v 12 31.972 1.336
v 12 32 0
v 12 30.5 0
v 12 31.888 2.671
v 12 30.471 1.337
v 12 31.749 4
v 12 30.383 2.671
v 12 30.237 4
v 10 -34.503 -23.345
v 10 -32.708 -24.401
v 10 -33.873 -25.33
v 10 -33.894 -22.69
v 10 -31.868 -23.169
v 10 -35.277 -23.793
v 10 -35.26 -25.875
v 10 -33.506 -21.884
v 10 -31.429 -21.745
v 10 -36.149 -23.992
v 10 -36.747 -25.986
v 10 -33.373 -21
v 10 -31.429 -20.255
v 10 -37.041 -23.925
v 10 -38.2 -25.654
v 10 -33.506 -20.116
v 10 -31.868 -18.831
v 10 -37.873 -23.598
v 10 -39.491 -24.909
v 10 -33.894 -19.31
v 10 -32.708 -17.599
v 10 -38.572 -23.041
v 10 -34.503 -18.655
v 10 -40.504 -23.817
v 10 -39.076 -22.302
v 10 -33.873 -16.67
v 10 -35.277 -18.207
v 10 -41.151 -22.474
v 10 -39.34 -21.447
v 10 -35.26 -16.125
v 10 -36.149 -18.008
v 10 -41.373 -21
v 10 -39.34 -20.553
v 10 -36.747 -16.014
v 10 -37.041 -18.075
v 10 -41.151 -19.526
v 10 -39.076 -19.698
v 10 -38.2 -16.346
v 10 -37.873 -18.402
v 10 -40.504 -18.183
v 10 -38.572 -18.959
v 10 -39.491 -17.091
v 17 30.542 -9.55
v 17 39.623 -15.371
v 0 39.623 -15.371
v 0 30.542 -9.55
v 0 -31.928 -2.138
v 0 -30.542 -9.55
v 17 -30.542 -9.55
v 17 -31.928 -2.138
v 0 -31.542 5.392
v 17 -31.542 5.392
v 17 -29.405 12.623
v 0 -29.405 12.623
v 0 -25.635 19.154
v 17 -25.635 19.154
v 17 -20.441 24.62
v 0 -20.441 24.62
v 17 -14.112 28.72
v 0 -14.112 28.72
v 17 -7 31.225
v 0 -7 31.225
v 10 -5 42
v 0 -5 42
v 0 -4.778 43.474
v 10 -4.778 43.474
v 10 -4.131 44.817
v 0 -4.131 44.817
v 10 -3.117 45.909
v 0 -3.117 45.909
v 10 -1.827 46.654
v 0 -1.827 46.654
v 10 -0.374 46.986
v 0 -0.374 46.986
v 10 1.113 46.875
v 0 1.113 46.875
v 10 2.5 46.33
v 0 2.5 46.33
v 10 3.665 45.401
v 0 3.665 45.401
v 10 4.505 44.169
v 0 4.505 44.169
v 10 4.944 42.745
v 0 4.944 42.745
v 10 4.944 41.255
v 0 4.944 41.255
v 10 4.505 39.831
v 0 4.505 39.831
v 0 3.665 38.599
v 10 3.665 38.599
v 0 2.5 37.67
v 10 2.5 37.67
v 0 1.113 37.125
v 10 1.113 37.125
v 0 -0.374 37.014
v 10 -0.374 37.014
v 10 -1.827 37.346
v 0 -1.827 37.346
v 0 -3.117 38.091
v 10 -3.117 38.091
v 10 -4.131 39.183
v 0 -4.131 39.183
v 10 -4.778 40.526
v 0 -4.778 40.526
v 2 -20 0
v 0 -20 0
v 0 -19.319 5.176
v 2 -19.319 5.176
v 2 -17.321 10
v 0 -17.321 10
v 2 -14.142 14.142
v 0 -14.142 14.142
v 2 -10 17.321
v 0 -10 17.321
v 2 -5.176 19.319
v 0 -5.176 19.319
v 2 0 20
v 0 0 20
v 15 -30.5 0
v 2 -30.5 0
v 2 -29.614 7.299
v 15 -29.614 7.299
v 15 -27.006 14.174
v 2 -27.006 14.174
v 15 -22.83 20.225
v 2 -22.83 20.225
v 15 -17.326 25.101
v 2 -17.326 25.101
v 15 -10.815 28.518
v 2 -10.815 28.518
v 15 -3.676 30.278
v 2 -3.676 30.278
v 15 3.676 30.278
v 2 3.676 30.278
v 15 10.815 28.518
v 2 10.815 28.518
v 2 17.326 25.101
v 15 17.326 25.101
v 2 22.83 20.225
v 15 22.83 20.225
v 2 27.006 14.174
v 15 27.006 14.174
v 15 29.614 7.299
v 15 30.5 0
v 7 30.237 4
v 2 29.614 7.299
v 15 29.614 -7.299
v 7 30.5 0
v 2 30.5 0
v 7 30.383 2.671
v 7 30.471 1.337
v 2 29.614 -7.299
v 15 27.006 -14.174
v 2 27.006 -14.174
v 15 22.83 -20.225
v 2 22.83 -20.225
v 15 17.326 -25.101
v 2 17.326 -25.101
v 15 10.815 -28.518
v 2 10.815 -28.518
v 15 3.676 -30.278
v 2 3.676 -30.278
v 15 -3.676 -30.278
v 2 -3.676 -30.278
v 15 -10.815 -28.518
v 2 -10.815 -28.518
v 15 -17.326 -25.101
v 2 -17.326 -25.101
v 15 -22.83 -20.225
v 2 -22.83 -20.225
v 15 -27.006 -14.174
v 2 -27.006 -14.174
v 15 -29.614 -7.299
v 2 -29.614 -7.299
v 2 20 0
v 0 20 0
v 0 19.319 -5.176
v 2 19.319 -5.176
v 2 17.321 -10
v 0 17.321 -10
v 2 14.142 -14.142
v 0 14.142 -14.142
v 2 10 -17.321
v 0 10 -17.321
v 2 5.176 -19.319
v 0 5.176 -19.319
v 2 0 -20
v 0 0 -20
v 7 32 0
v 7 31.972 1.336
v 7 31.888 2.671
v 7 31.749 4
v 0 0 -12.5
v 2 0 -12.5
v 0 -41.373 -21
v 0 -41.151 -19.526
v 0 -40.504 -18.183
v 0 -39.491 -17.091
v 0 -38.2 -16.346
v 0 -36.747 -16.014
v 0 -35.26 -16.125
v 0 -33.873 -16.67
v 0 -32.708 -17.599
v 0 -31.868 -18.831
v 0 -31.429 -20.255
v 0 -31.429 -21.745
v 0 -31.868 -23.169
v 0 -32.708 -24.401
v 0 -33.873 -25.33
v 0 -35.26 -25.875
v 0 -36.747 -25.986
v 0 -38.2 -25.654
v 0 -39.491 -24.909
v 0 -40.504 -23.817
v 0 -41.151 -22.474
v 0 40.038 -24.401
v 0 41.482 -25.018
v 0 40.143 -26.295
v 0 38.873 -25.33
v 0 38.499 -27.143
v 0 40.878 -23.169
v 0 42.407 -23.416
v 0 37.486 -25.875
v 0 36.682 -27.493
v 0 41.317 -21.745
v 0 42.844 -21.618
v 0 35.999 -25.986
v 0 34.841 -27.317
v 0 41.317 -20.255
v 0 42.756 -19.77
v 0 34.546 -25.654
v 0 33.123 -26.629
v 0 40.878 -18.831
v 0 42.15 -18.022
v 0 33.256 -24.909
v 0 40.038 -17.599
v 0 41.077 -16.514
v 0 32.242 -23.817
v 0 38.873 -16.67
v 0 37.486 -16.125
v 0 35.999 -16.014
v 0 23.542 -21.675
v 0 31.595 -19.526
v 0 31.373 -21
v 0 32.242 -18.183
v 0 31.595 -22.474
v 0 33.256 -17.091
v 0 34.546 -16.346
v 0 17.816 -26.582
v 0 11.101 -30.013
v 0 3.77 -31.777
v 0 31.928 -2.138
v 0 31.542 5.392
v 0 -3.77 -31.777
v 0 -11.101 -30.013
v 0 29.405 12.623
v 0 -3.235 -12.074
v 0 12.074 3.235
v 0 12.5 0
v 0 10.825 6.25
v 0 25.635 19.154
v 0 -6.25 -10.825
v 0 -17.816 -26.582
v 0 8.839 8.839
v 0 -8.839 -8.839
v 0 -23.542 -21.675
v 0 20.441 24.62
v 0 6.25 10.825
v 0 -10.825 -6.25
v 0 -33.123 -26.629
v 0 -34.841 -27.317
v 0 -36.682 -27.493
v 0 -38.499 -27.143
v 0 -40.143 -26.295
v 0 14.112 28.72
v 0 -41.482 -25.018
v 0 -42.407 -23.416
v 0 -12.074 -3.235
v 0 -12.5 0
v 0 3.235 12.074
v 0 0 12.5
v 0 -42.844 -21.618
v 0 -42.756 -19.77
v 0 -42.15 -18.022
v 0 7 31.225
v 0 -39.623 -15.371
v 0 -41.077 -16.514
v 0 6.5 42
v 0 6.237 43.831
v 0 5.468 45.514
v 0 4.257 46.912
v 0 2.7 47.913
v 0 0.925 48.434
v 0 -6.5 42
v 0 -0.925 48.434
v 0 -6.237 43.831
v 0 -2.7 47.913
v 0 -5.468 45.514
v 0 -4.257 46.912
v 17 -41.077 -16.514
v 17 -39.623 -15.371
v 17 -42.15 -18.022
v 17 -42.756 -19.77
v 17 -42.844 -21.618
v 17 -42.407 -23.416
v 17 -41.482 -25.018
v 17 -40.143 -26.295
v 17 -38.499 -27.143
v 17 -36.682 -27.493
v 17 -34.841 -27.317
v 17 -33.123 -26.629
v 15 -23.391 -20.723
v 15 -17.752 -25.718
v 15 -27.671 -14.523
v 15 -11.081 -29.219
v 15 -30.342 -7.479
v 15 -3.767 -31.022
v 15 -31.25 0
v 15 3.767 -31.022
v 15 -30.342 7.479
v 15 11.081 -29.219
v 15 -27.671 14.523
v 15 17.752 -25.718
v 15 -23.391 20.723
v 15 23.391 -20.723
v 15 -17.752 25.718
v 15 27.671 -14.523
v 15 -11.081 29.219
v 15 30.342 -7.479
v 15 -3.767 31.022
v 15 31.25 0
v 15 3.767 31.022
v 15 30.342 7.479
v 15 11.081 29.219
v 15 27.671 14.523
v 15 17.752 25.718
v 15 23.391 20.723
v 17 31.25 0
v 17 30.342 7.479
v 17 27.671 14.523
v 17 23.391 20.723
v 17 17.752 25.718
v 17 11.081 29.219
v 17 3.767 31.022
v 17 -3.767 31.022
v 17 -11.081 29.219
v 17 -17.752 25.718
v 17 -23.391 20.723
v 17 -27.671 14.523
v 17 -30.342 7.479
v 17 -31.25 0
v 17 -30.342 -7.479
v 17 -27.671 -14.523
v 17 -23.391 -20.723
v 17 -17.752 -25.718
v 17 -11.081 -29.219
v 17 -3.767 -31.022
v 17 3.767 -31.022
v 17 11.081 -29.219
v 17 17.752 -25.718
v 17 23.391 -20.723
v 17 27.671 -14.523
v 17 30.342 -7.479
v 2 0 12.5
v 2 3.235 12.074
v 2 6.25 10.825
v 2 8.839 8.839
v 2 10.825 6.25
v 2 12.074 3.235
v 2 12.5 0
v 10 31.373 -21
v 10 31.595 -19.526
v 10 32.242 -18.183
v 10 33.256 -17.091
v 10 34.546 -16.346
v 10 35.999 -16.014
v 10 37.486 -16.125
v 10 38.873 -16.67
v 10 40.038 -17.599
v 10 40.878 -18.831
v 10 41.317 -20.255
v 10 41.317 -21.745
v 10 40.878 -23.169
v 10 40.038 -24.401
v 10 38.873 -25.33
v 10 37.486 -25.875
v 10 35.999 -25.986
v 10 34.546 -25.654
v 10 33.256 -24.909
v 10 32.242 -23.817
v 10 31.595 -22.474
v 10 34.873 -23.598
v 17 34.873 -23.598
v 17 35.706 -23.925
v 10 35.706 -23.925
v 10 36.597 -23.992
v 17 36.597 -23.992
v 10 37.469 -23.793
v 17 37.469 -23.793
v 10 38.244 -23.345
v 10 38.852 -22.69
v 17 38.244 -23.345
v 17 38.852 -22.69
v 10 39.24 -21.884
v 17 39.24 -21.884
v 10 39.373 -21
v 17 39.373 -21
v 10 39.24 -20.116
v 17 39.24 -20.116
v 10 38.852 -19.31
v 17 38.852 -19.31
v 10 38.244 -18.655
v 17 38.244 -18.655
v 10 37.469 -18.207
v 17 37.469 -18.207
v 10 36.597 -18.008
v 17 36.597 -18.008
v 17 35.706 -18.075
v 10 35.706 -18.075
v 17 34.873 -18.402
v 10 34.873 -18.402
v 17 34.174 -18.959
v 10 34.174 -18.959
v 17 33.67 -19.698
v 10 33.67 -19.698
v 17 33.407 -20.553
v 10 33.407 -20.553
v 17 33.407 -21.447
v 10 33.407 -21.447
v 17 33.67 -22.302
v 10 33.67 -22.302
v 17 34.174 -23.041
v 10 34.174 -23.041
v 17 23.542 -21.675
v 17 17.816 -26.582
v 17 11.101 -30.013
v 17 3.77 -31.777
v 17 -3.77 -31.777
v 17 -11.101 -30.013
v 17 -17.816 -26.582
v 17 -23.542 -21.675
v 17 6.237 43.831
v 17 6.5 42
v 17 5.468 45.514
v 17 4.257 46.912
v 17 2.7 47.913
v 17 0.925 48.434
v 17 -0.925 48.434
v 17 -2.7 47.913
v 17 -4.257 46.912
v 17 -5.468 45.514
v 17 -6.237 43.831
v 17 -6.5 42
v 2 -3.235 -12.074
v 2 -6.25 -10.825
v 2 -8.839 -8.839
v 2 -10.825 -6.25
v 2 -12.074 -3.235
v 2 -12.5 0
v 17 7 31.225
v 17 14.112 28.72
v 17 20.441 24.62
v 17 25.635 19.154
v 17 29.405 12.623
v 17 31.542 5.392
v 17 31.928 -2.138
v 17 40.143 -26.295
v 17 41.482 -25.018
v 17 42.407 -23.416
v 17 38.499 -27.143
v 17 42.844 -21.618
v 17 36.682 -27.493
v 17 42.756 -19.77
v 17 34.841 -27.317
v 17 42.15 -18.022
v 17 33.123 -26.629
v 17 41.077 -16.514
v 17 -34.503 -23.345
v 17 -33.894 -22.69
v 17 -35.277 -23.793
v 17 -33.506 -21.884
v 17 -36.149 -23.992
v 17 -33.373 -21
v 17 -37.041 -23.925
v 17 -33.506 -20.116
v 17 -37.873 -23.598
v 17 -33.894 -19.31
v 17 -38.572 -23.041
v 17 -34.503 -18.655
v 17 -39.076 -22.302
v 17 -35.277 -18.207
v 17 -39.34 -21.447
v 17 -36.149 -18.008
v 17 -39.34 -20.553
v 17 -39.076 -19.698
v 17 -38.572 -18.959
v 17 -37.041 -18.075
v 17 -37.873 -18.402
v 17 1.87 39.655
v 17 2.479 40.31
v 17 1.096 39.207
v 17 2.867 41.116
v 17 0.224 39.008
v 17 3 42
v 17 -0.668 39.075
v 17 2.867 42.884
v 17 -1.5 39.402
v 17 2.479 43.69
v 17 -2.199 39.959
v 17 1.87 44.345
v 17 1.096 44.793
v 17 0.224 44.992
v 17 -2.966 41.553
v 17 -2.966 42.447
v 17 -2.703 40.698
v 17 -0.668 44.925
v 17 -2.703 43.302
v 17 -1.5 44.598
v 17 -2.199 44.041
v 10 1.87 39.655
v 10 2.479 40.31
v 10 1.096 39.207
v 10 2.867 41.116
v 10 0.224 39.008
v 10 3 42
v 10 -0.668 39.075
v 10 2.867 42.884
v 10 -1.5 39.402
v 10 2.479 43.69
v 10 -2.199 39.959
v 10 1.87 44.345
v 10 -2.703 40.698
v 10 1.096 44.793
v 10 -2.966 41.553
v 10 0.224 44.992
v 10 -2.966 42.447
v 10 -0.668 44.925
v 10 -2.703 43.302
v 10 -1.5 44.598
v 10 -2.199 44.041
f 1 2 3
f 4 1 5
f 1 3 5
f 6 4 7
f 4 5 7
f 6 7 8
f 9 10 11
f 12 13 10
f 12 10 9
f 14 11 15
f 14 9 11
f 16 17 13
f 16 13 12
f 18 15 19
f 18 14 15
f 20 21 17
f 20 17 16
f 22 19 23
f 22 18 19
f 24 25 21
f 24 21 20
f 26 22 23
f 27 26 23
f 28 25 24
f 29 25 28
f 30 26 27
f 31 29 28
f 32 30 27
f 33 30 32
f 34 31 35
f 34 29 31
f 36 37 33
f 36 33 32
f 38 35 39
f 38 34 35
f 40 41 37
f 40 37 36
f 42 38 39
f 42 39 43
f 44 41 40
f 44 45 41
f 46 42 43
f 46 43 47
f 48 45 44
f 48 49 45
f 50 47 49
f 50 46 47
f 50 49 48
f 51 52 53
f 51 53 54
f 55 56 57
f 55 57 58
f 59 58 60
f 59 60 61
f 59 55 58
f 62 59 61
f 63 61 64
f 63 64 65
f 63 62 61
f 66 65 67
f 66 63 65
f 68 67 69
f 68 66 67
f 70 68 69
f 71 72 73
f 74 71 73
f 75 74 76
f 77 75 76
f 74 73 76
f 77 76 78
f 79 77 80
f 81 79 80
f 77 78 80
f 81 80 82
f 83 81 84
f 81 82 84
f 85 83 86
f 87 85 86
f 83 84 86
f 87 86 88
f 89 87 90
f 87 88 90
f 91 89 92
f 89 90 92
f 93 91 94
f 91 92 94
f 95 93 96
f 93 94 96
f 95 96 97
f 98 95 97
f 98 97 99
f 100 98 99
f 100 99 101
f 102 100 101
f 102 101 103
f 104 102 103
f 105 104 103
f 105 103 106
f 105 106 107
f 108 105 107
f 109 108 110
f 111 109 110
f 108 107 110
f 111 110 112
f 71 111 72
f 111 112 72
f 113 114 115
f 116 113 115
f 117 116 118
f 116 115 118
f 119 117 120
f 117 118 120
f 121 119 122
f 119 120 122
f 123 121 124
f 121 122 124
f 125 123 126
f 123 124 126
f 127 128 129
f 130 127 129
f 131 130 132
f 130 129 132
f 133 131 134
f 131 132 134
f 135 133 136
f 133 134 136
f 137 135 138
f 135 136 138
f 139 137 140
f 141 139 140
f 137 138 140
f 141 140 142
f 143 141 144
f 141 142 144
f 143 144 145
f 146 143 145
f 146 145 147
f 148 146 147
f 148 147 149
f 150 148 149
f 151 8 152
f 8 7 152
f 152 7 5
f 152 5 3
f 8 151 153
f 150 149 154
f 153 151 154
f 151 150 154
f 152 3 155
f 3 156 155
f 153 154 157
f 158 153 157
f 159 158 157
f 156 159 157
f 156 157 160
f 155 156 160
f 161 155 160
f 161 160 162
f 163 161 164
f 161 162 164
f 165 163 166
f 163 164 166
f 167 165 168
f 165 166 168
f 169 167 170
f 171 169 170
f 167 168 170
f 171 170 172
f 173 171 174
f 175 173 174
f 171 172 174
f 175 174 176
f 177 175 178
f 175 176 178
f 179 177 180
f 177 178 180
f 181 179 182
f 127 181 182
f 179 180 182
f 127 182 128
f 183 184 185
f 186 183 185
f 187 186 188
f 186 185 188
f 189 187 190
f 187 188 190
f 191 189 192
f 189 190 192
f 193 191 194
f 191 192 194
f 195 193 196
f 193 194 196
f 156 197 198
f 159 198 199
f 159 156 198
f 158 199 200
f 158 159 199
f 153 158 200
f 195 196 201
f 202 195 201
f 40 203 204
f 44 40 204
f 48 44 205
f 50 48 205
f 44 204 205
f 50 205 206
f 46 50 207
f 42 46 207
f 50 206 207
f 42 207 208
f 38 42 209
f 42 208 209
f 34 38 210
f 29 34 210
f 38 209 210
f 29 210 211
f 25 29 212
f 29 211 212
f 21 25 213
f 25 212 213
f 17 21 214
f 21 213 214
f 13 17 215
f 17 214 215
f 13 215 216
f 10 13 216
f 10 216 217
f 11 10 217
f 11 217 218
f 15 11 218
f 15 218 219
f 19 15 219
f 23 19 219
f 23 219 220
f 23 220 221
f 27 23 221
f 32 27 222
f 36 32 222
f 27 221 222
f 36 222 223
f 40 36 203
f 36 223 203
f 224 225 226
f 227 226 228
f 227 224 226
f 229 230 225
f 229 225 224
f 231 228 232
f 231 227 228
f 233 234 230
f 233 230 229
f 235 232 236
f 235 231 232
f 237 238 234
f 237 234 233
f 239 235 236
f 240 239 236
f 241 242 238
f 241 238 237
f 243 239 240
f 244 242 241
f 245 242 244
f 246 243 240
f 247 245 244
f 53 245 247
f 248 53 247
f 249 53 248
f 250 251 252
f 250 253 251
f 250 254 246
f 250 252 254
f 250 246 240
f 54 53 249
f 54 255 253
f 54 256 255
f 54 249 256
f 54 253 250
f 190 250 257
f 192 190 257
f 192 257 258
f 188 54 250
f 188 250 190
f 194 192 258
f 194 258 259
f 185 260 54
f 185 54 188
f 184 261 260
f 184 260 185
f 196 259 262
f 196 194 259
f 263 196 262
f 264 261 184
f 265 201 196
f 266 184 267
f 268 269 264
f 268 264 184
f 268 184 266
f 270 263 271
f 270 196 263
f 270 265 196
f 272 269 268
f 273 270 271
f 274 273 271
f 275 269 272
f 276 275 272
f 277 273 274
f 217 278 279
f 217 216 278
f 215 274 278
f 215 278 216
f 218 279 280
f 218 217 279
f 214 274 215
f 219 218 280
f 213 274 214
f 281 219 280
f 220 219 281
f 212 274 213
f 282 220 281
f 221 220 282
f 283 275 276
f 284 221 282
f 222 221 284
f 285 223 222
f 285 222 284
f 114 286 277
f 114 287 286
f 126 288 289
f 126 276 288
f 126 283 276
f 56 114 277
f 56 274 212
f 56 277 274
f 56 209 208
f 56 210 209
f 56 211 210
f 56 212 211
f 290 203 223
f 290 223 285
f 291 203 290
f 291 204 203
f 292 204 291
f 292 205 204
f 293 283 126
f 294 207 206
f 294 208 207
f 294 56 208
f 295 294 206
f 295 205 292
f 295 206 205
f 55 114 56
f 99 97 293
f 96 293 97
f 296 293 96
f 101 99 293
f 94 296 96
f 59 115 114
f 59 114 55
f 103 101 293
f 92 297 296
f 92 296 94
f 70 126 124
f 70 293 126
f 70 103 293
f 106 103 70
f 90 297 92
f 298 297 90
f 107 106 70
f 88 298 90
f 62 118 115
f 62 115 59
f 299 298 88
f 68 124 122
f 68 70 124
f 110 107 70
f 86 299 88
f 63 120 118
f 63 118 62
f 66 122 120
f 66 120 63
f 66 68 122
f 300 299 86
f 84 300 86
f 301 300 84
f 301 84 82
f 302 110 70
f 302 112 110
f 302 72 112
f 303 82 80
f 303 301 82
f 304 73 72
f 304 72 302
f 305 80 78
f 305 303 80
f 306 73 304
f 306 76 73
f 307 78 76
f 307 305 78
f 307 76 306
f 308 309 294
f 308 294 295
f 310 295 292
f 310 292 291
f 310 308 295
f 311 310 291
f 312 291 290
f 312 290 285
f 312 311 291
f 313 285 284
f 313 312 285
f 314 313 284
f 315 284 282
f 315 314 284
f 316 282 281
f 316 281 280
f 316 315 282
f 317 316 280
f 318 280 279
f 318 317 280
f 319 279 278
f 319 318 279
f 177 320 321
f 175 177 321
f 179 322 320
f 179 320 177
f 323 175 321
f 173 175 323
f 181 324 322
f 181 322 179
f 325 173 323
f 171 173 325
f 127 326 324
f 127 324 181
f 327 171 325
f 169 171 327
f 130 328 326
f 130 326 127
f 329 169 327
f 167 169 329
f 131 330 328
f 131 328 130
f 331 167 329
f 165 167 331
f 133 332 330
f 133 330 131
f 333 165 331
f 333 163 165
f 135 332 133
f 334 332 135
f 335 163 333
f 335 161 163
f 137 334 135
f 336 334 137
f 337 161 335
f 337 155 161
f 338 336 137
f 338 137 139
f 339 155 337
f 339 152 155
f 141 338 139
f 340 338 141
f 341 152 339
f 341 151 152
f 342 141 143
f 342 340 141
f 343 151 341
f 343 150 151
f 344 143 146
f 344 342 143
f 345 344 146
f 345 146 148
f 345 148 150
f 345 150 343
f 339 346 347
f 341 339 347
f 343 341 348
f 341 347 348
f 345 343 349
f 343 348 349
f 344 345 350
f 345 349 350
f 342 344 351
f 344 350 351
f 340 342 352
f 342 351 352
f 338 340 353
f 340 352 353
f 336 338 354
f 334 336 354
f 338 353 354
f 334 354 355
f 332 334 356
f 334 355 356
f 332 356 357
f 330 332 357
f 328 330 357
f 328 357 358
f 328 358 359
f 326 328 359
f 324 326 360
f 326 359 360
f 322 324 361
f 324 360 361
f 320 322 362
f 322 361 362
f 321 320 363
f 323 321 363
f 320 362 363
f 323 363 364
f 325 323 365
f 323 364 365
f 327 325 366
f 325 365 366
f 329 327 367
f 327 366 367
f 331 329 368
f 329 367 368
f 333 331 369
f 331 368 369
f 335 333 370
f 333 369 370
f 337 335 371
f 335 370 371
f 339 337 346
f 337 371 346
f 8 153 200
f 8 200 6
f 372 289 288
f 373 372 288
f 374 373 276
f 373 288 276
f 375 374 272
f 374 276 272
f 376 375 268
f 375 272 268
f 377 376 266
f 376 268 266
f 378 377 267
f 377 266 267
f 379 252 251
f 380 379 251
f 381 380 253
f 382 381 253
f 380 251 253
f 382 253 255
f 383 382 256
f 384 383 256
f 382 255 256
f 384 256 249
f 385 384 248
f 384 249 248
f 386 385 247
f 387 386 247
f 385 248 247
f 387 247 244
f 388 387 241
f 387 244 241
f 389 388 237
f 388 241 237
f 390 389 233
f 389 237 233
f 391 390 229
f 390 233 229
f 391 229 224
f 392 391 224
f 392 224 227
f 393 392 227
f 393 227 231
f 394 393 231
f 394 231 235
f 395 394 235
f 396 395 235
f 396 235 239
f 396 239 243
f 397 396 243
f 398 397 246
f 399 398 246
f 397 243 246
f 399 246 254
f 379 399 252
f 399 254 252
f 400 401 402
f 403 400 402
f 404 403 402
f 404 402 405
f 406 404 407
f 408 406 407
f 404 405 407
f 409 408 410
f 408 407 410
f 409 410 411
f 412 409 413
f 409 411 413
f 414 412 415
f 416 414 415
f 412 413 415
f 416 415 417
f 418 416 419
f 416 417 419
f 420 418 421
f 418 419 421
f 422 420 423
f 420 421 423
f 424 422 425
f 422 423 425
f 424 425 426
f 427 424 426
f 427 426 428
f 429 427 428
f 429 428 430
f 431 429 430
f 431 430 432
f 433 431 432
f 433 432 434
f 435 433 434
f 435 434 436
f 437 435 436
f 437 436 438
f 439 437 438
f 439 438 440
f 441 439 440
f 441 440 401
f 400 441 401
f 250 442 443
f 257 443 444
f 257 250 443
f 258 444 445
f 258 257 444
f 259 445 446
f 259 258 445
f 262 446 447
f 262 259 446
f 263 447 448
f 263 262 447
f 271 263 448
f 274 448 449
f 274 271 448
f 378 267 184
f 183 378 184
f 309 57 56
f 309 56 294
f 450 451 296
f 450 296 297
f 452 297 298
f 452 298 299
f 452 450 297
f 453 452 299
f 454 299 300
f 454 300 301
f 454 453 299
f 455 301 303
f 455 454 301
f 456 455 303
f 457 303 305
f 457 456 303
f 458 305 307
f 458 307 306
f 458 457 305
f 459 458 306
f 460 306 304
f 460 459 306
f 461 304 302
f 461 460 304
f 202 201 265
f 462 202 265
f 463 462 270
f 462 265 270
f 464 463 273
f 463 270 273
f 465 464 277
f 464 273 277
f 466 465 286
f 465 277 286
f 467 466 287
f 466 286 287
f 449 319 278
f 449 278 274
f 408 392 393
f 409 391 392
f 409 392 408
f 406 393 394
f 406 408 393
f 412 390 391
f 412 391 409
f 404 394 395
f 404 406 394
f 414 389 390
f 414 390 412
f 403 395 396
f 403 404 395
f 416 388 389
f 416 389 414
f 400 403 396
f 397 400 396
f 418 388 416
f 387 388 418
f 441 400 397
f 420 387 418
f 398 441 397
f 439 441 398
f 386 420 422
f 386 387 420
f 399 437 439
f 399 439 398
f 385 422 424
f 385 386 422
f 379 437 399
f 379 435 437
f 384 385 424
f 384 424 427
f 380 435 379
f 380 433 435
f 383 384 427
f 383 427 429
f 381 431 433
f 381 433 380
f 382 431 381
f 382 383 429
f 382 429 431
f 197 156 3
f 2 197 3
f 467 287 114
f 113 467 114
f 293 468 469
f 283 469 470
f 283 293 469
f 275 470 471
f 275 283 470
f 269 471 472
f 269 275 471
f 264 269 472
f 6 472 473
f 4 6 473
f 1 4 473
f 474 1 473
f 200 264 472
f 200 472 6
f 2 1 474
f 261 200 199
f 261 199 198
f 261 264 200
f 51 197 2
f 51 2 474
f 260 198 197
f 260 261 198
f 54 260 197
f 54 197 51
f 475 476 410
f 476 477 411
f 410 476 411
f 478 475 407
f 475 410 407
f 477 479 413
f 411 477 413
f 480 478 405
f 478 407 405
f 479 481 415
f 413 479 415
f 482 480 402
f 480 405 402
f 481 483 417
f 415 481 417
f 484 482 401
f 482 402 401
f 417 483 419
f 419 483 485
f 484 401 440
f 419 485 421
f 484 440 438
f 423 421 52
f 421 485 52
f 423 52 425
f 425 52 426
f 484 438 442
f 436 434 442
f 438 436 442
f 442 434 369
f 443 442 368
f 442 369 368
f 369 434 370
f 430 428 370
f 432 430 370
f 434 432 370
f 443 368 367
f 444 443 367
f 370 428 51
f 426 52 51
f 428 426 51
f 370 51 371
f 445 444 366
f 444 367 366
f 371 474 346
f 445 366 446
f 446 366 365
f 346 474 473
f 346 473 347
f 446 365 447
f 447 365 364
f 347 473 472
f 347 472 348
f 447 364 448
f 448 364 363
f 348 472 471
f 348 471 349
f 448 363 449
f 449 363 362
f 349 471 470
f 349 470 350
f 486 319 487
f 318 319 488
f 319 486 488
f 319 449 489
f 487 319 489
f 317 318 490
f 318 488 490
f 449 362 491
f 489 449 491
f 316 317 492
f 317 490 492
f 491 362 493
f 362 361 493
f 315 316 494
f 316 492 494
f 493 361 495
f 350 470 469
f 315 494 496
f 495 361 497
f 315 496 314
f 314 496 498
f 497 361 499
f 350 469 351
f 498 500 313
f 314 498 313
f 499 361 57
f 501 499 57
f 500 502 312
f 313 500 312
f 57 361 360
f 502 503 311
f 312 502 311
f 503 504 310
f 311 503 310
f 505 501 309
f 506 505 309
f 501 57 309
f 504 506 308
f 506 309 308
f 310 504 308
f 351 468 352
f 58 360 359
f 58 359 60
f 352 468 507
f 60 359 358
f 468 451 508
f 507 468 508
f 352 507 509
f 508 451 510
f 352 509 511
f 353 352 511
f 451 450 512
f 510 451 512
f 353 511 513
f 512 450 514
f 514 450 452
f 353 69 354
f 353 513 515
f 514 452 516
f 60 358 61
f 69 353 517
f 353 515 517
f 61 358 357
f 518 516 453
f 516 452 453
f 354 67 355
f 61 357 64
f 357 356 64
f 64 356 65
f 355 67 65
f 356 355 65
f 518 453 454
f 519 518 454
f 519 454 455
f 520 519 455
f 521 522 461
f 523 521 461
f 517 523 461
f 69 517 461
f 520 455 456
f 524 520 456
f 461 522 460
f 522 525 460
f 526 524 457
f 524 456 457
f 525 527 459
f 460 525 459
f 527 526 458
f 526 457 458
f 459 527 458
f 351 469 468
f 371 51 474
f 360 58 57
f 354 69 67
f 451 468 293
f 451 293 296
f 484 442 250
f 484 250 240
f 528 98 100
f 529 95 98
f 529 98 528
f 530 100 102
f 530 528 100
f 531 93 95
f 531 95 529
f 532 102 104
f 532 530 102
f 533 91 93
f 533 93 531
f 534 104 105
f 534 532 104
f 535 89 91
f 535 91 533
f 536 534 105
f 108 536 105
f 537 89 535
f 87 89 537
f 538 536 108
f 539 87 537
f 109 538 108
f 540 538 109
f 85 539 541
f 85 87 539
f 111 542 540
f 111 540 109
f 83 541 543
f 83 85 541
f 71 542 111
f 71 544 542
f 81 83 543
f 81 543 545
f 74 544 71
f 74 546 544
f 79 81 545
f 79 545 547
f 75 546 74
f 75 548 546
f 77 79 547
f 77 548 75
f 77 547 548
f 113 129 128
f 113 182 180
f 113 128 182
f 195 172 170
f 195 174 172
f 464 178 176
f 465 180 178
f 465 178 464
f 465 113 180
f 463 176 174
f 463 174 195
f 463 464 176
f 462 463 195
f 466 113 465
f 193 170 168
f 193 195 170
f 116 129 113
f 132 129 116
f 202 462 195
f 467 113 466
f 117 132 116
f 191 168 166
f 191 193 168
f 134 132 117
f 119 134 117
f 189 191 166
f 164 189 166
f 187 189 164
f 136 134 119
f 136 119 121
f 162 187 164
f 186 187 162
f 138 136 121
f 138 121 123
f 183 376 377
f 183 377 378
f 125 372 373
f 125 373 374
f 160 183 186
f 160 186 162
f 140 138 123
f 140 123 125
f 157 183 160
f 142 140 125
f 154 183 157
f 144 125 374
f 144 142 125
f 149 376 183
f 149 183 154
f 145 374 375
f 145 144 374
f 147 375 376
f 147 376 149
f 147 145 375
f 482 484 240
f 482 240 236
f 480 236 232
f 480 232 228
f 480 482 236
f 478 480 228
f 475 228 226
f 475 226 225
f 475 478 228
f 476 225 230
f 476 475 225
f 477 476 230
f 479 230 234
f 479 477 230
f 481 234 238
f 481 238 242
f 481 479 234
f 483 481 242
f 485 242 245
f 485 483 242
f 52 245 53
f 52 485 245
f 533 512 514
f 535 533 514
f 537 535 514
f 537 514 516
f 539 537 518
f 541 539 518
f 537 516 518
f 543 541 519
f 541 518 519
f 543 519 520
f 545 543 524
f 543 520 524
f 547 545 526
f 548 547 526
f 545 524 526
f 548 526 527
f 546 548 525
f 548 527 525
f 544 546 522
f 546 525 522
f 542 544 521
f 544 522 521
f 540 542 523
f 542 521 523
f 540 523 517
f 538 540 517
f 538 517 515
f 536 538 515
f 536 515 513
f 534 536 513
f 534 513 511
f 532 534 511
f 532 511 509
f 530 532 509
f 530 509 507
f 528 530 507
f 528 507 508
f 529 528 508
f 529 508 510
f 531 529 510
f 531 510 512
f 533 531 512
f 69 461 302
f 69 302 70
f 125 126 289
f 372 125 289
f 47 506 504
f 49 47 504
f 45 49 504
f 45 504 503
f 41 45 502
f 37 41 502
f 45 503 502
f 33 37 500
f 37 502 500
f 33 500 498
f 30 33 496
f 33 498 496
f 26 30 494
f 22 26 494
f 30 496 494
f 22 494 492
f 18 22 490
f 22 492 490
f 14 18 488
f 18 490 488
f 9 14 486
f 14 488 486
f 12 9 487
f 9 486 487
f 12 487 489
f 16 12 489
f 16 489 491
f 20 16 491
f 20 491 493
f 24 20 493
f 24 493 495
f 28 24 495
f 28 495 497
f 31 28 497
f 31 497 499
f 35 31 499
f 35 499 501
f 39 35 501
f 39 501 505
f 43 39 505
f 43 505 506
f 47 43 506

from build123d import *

# Parameters (mm, degrees)
F0_R            = 30.5
F0_R_2          = 9.5
F1_DEPTH        = 2
F2_R            = 32
F2_R_2          = 30.5
F3_DEPTH        = 17
F4_R            = 3
F5_DEPTH        = 17
F5_COPIES_COUNT = 3
F6_R            = 31.25
F7_DEPTH        = 2
F8_W            = 5
F8_H            = 4
F9_DEPTH        = 43.1
F10_R           = 5
F11_DEPTH       = 10
F13_DEPTH       = 25


# Not quite as in the source:
# - a pattern or mirror of a feature is missing from the dataset's text; its kind, count and spacing are read off the source's solid


with BuildPart() as f1:
    # F0 (on Right) → F1 (new body)
    with BuildSketch(Plane.YZ):
        Circle(F0_R)
        Circle(F0_R_2, mode=Mode.SUBTRACT)
    extrude(amount=F1_DEPTH)

    # F2 (on face) → F3 (join)
    with BuildSketch(Plane(origin=(0, 0, 0), x_dir=(0, -1, 0), z_dir=(-1, 0, 0))):
        Circle(F2_R)
        Circle(F2_R_2, mode=Mode.SUBTRACT)
    extrude(amount=-F3_DEPTH)

    # F4 (on face) → F5 (join)
    with BuildSketch(Plane.YZ.offset(17)):
        with BuildLine():
            ThreePointArc((-6.5, 42), (0, 35.5), (6.5, 42))
            ThreePointArc((6.5, 42), (0, 48.5), (-6.5, 42))
        make_face()
        with Locations((0, 42)):
            Circle(F4_R, mode=Mode.SUBTRACT)
        with BuildLine():
            Line((7, 31.224989992), (6.5, 42))
            ThreePointArc((6.5, 42), (0, 35.5), (-6.5, 42))
            Line((-6.5, 42), (-7, 31.224989992))
            ThreePointArc((-7, 31.224989992), (0, 32), (7, 31.224989992))
        make_face()
    f5 = extrude(amount=-F5_DEPTH)

    # F5_copies: F5 ×3 about axis
    f5_copies_axis = Axis((0, 0, 0), (1, 0, 0))
    for i in range(1, F5_COPIES_COUNT):
        add(f5.rotate(f5_copies_axis, i * 360 / F5_COPIES_COUNT))

    # F6 (on face) → F7 (cut)
    with BuildSketch(Plane.YZ.offset(17)):
        Circle(F6_R)
    extrude(amount=-F7_DEPTH, mode=Mode.SUBTRACT)

    # F8 (on Front) → F9 (cut)
    with BuildSketch(Plane.XZ):
        with Locations((9.5, 2)):
            Rectangle(F8_W, F8_H)
    extrude(amount=-F9_DEPTH, mode=Mode.SUBTRACT)

    # F10 (on face) → F11 (cut)
    with BuildSketch(Plane(origin=(0, 0, 0), x_dir=(0, -1, 0), z_dir=(-1, 0, 0))):
        with Locations((-36.3730669589, -21)):
            Circle(F10_R)
        with Locations((0, 42)):
            Circle(F10_R)
        with Locations((36.3730669589, -21)):
            Circle(F10_R)
    extrude(amount=-F11_DEPTH, mode=Mode.SUBTRACT)

    # F12 (on face) → F13 (cut)
    with BuildSketch(Plane(origin=(0, 0, 0), x_dir=(0, -1, 0), z_dir=(-1, 0, 0))):
        with BuildLine():
            Line((-12.5, 0), (-20, 0))
            ThreePointArc((-20, 0), (-14.1421356237, -14.1421356237), (0, -20))
            Line((0, -20), (0, -12.5))
            ThreePointArc((0, -12.5), (8.8388347648, -8.8388347648), (12.5, 0))
            Line((12.5, 0), (20, 0))
            ThreePointArc((20, 0), (14.1421356237, 14.1421356237), (0, 20))
            Line((0, 20), (0, 12.5))
            ThreePointArc((0, 12.5), (-8.8388347648, 8.8388347648), (-12.5, 0))
        make_face()
    extrude(amount=-F13_DEPTH, mode=Mode.SUBTRACT)


solid = f1.part
